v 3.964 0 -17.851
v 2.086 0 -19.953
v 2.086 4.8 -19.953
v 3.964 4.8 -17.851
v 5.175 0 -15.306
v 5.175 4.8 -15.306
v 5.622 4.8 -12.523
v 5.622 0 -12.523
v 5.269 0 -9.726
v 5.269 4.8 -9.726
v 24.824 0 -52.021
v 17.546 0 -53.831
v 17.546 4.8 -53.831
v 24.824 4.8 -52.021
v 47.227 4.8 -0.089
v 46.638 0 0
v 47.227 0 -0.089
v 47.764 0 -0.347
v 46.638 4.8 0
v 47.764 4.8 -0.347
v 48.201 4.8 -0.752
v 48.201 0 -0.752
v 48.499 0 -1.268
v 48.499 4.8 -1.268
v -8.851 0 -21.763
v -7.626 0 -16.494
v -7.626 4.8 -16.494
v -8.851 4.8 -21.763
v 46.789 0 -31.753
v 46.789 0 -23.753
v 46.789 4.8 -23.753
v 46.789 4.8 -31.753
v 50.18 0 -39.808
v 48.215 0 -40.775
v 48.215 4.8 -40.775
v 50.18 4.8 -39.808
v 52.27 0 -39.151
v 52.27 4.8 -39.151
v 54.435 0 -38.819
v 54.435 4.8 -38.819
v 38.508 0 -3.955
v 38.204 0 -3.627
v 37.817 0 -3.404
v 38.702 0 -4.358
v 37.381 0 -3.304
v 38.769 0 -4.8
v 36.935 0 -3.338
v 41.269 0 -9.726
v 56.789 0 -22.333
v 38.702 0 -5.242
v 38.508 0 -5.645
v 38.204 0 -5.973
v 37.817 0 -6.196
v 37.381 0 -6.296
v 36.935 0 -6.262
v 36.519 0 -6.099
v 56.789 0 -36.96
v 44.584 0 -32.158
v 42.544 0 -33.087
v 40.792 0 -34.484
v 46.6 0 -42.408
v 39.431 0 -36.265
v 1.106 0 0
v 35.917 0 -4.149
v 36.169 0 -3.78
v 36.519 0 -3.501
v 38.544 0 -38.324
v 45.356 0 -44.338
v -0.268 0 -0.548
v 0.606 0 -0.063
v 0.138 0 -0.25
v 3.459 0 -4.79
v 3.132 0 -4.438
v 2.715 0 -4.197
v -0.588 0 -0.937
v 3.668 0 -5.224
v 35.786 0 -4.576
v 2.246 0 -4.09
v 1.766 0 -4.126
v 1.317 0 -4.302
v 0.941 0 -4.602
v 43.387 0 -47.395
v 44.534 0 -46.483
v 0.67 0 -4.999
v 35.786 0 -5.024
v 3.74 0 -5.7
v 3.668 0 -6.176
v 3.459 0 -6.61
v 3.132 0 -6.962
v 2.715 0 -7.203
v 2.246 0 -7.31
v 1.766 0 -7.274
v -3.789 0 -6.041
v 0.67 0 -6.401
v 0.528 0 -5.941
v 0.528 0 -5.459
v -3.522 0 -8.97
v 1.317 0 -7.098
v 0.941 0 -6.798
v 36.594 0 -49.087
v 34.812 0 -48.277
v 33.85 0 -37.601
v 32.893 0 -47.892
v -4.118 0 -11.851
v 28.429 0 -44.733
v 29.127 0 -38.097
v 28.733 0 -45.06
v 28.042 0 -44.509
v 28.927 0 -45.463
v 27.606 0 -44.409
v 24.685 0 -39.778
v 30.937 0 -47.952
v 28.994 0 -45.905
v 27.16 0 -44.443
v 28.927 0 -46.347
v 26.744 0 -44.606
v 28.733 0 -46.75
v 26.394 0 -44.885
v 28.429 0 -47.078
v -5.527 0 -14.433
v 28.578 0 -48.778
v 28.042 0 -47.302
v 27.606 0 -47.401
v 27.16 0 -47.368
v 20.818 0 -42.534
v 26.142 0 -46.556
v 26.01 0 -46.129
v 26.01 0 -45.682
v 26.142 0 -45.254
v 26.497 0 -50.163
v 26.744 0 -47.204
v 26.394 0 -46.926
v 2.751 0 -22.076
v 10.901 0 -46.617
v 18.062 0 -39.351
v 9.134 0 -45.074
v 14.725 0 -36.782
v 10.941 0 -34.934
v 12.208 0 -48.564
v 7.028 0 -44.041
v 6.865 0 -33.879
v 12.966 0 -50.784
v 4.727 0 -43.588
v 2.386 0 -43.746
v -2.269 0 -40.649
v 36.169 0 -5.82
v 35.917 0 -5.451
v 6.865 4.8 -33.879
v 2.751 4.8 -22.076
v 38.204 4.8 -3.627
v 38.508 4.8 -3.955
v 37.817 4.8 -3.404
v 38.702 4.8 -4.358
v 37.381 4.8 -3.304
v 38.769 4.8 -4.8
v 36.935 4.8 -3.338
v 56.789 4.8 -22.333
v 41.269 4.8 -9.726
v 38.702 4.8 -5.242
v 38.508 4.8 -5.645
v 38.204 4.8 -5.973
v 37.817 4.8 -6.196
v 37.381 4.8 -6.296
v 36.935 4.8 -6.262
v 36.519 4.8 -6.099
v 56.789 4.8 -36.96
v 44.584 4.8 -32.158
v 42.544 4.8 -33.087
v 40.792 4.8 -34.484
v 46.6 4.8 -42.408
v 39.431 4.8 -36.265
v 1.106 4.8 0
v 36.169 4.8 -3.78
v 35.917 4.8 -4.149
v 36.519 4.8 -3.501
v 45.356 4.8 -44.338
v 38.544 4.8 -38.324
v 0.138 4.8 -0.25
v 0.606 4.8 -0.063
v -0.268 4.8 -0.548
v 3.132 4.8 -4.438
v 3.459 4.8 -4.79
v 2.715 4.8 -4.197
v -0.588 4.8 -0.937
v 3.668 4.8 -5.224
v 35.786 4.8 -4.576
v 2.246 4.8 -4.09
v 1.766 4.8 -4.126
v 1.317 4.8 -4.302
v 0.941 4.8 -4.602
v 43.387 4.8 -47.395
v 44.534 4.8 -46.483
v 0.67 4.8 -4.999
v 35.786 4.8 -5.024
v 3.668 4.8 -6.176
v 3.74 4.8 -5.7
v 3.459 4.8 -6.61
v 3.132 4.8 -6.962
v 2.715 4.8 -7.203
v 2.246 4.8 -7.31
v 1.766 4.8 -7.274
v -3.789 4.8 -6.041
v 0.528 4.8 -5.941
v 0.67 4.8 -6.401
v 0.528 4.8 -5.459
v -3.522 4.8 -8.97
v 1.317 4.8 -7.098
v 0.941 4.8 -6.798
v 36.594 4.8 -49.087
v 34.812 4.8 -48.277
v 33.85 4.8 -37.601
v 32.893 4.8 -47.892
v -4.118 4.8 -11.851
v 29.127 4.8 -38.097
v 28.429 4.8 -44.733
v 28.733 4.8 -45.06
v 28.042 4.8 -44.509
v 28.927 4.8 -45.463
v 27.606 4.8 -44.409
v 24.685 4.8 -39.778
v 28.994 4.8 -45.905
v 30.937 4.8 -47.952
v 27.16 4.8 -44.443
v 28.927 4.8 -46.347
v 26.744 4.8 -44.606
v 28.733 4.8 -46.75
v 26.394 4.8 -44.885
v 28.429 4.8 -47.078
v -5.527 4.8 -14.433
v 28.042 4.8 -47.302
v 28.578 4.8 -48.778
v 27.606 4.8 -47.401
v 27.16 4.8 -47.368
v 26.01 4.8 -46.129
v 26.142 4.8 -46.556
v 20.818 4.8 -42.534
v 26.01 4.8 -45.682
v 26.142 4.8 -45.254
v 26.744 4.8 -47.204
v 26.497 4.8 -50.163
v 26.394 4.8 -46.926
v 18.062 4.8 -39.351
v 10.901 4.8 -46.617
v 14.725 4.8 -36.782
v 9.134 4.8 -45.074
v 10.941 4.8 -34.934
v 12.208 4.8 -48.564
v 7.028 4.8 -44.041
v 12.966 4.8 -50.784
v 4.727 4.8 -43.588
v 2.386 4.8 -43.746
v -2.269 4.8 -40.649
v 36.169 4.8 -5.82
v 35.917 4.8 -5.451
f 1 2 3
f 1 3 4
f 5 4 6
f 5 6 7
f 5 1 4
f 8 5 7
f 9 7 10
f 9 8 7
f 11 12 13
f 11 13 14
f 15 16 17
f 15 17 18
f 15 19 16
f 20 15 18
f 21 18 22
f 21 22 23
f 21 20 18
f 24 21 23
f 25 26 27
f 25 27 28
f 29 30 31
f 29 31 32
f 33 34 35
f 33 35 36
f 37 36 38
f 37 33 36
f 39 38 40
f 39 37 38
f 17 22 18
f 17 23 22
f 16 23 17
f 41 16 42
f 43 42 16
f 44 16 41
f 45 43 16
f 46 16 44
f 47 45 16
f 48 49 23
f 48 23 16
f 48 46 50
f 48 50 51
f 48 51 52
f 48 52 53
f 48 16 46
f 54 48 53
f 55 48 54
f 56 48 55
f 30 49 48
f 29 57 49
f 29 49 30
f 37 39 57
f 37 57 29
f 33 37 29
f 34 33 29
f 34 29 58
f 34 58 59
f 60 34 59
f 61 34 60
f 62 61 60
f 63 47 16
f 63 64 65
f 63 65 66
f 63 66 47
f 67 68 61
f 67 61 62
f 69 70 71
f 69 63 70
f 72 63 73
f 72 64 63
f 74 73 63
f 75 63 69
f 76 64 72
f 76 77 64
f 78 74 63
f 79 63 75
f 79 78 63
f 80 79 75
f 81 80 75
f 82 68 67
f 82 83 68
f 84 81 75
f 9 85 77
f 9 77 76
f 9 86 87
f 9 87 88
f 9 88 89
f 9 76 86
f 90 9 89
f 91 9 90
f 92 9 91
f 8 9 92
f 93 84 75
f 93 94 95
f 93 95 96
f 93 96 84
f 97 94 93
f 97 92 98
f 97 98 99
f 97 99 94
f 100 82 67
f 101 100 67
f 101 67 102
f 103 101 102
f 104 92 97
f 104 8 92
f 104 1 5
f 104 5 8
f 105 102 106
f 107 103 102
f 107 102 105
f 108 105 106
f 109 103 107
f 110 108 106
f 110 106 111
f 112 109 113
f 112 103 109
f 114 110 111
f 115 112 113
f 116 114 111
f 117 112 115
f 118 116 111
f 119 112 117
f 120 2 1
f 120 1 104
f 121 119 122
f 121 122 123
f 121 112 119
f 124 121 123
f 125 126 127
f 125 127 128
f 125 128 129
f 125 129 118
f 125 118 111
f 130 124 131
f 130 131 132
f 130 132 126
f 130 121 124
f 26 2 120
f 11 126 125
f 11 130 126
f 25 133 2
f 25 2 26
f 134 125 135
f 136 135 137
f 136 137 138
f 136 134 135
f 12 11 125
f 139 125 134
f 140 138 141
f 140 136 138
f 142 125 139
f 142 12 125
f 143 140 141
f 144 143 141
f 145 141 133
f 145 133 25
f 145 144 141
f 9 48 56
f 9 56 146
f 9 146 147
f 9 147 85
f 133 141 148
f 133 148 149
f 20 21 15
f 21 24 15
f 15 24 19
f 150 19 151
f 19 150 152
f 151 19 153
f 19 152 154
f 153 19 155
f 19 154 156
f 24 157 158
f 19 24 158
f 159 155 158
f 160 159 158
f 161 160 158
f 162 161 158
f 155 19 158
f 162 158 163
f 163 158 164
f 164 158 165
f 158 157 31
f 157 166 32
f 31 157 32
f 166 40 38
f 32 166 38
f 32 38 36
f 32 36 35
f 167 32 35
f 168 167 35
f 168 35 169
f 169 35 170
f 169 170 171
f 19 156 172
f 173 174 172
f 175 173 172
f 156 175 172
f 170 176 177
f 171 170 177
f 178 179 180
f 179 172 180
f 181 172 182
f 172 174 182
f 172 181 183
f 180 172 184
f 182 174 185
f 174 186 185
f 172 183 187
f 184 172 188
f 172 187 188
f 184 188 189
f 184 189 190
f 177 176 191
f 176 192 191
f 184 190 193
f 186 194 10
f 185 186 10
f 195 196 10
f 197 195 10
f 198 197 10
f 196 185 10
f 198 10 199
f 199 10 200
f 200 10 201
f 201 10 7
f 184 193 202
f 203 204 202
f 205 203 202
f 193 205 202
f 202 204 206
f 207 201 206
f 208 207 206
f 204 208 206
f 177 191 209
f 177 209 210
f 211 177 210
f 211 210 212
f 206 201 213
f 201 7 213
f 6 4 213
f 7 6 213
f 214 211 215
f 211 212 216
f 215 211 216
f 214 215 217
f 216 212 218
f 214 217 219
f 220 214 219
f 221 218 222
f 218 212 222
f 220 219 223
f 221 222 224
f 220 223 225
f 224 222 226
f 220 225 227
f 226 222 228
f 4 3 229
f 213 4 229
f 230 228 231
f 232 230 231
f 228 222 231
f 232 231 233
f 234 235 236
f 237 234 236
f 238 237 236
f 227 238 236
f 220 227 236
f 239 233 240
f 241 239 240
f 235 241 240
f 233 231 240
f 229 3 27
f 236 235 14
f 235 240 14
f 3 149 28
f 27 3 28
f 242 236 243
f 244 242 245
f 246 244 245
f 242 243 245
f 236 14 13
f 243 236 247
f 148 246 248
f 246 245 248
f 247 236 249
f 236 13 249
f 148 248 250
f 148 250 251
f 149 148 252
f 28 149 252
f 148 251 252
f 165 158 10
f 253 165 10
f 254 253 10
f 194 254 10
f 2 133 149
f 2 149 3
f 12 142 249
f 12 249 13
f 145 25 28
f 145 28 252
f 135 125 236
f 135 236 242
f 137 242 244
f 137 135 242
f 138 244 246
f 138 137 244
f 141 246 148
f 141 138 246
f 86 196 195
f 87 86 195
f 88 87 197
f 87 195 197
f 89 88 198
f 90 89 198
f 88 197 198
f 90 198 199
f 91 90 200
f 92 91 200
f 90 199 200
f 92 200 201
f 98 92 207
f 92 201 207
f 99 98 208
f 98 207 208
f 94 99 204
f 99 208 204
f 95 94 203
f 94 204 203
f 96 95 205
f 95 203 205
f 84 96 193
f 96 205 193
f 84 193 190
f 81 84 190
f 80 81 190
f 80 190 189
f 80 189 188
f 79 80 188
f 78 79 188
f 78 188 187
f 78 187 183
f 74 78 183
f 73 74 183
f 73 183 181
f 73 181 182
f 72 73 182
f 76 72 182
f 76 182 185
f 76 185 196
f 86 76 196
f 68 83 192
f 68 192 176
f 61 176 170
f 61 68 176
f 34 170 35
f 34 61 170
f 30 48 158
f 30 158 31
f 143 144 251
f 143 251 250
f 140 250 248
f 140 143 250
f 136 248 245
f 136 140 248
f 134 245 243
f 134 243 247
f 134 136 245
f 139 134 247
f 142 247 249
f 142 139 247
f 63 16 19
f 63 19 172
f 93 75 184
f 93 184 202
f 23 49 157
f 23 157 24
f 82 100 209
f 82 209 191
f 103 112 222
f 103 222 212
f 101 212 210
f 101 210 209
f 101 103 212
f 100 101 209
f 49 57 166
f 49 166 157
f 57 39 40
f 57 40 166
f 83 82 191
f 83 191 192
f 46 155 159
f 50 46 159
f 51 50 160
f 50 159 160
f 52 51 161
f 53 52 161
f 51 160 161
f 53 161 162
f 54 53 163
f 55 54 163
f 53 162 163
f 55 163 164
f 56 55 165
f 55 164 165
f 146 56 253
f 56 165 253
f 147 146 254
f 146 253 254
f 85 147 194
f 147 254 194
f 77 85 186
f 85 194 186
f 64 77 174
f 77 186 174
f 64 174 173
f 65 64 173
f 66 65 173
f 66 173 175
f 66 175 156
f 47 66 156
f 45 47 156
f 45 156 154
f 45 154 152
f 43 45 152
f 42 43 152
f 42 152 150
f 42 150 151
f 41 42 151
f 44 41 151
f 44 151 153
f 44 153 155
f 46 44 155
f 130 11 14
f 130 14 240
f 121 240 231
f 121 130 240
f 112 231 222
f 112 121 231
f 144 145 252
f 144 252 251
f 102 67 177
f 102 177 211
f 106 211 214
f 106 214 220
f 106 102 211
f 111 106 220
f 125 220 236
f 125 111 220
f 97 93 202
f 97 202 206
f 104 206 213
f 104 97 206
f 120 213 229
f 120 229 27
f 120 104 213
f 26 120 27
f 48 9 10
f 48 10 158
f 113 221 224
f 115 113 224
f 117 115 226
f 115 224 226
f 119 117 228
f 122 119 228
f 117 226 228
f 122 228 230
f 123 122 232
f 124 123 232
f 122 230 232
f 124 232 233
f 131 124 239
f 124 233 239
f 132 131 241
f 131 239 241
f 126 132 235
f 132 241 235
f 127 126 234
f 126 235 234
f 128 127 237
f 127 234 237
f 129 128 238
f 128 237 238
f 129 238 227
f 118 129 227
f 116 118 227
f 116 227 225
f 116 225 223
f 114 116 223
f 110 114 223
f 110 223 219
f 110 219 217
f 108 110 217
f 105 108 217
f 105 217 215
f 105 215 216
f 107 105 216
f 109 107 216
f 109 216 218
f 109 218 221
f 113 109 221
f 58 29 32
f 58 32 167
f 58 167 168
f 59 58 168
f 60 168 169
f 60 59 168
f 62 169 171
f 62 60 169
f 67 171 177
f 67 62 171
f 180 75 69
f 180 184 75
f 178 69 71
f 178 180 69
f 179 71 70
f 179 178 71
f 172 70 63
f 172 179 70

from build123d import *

# Parameters (mm, degrees)
BOSS_EXTRUDE1_DEPTH = 4.8
FILLET1_R           = 2
SKETCH2_R           = 1.5
SKETCH2_R_2         = 1.614746674
CUT_EXTRUDE1_DEPTH  = 10


with BuildPart() as part:
    # Sketch1 → Boss-Extrude1 (new body)
    with BuildSketch(Plane(origin=(0, 0, 0), x_dir=(1, 0, 0), z_dir=(0, 1, 0))):
        with BuildLine():
            Line((-7.626177736, 16.493998363), (-8.85052129, 21.762554574))
            Line((-8.85052129, 21.762554574), (-2.268963588, 40.648610229))
            Line((-2.268963588, 40.648610229), (2.386475485, 43.745687988))
            ThreePointArc((2.386475485, 43.745687988), (9.13418612, 45.073723969), (12.966474819, 50.784139165))
            Line((12.966474819, 50.784139165), (17.54572209, 53.830529559))
            Line((17.54572209, 53.830529559), (24.824248009, 52.021369411))
            ThreePointArc((24.824248009, 52.021369411), (27.493630804, 49.405257048), (30.937059303, 47.951830552))
            ThreePointArc((30.937059303, 47.951830552), (33.863857438, 48.029479081), (36.594025871, 49.08700305))
            Line((36.594025871, 49.08700305), (43.386576908, 47.395479947))
            Line((43.386576908, 47.395479947), (44.534165754, 46.483148945))
            ThreePointArc((44.534165754, 46.483148945), (45.928151501, 43.341073181), (48.215256064, 40.774949823))
            ThreePointArc((48.215256064, 40.774949823), (51.212544898, 39.439353475), (54.434824491, 38.819295269))
            Line((54.434824491, 38.819295269), (56.78893552, 36.959682067))
            Line((56.78893552, 36.959682067), (56.78893552, 22.3328147))
            Line((56.78893552, 22.3328147), (48, 0))
            Line((48, 0), (0, 0))
            Line((0, 0), (-3.788950591, 6.040862349))
            ThreePointArc((-3.788950591, 6.040862349), (-4.118018176, 11.850934579), (-7.626177736, 16.493998363))
        make_face()
        with BuildLine():
            Line((5.26881179, 9.725992339), (41.26881179, 9.725992339))
            Line((41.26881179, 9.725992339), (46.78893552, 23.7527081))
            Line((46.78893552, 23.7527081), (46.78893552, 31.7527081))
            ThreePointArc((46.78893552, 31.7527081), (41.625067619, 33.731492126), (38.544083054, 38.323730364))
            ThreePointArc((38.544083054, 38.323730364), (29.126849272, 38.096934575), (20.817558646, 42.534435867))
            ThreePointArc((20.817558646, 42.534435867), (14.72472781, 36.782412637), (6.864667897, 33.879342365))
            Line((6.864667897, 33.879342365), (2.751194333, 22.075557581))
            Line((2.751194333, 22.075557581), (2.085687611, 19.952561058))
            ThreePointArc((2.085687611, 19.952561058), (5.175485312, 15.305617866), (5.26881179, 9.725992339))
        make_face(mode=Mode.SUBTRACT)
    extrude(amount=BOSS_EXTRUDE1_DEPTH)

    # Fillet1
    fillet1_edges = [part.edges().sort_by_distance(p)[0] for p in [
        (48, 2.4, 0),
        (0, 2.4, 0),
    ]]
    fillet(fillet1_edges, radius=FILLET1_R)

    # Sketch2 → Cut-Extrude1 (cut)
    with BuildSketch(Plane(origin=(0, 4.8, 0), x_dir=(1, 0, 0), z_dir=(0, 1, 0))):
        with Locations((27.493630804, 45.905257048)):
            Circle(SKETCH2_R)
        with Locations((2.124845143, 5.7)):
            Circle(SKETCH2_R_2)
        with Locations((37.26881179, 4.8)):
            Circle(SKETCH2_R)
    extrude(amount=-CUT_EXTRUDE1_DEPTH, mode=Mode.SUBTRACT)


solid = part.part
